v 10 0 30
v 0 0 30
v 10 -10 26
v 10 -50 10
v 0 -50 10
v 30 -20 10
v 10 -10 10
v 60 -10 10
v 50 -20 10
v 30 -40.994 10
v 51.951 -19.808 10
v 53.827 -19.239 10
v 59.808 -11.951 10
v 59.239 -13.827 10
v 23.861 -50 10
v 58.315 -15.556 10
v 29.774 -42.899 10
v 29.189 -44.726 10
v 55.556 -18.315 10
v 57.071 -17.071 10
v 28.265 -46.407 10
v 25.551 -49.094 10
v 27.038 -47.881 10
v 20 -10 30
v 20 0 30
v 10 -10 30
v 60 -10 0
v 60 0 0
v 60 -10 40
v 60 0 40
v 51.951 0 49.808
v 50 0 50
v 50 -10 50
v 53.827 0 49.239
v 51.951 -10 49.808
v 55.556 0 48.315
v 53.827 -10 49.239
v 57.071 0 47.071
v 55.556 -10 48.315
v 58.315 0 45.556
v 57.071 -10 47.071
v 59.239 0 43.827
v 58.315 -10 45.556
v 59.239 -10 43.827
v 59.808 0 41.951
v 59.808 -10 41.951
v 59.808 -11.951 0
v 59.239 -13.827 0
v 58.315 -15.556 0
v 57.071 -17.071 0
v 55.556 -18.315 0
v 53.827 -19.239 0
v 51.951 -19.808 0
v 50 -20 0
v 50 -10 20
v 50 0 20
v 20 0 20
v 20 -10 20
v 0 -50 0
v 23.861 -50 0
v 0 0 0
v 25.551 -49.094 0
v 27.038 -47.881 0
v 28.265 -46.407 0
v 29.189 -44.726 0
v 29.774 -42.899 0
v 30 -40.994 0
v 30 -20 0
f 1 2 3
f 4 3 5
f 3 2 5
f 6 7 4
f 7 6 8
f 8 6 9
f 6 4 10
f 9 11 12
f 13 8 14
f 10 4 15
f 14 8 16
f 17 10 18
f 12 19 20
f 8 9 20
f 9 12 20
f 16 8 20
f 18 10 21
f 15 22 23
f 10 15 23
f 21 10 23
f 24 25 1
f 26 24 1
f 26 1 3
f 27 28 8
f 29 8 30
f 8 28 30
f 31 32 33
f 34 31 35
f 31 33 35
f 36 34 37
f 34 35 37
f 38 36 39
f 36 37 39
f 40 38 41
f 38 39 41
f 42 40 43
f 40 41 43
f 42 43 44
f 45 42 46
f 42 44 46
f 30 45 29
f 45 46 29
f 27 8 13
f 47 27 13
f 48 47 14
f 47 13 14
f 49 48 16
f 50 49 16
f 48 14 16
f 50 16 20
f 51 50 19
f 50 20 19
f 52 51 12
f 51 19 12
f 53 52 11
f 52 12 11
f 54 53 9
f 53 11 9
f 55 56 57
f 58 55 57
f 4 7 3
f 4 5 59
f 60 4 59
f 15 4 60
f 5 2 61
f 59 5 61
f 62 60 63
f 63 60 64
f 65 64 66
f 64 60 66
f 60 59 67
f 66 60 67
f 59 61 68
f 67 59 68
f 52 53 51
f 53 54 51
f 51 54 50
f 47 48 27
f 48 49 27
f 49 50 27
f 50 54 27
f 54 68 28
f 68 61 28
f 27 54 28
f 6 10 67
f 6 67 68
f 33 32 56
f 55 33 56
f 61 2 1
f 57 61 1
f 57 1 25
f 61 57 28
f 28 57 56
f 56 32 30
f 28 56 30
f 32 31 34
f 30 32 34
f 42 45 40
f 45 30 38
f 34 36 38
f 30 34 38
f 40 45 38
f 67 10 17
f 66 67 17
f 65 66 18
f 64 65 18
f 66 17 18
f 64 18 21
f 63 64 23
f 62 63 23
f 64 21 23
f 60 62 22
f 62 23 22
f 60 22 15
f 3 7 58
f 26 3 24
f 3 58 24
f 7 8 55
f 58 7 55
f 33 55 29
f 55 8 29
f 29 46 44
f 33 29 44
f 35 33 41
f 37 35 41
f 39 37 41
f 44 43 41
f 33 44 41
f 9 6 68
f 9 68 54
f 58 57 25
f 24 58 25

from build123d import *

# Parameters (mm, degrees)
F1_DEPTH  = 50
F3_DEPTH  = 40
F4_W      = 10
F4_H      = 10
F5_DEPTH  = 40
F7_DEPTH  = 10
F8_W      = 40
F8_H      = 30
F9_DEPTH  = 40
F11_DEPTH = 25
F12_W     = 30
F12_H     = 30
F13_DEPTH = 10
F15_DEPTH = 10


with BuildPart() as f1:
    # F0 (on Front) → F1 (new body)
    with BuildSketch(Plane.XZ):
        Polygon((0, 30), (0, 0), (60, 0), (60, 50), (50, 50), (50, 20), (20, 20), (20, 30), align=None)
    extrude(amount=F1_DEPTH)

    # F2 (on face) → F3 (cut)
    with BuildSketch(Plane.XZ.offset(50)):
        Polygon((10, 20), (10, 10), (60, 10), (60, 20), (50, 20), (20, 20), align=None)
    extrude(amount=-F3_DEPTH, mode=Mode.SUBTRACT)

    # F4 (on face) → F5 (cut)
    with BuildSketch(Plane.XZ.offset(50)):
        with Locations((15, 25)):
            Rectangle(F4_W, F4_H)
    extrude(amount=-F5_DEPTH, mode=Mode.SUBTRACT)

    # F6 (on face) → F7 (cut)
    with BuildSketch(Plane(origin=(0, 0, 0), x_dir=(0, -1, 0), z_dir=(-1, 0, 0))):
        Polygon((0, 30), (50, 10), (50, 30), align=None)
    extrude(amount=-F7_DEPTH, mode=Mode.SUBTRACT)

    # F8 (on face) → F9 (cut)
    with BuildSketch(Plane.YZ.offset(60)):
        with Locations((-30, 35)):
            Rectangle(F8_W, F8_H)
    extrude(amount=-F9_DEPTH, mode=Mode.SUBTRACT)

    # F10 (on face) → F11 (cut)
    with BuildSketch(Plane.XZ.offset(10)):
        with BuildLine():
            ThreePointArc((50, 50), (57.0710678119, 47.0710678119), (60, 40))
            Line((60, 40), (60, 50))
            Line((60, 50), (50, 50))
        make_face()
    extrude(amount=-F11_DEPTH, mode=Mode.SUBTRACT)

    # F12 (on face) → F13 (cut)
    with BuildSketch(Plane.XY.offset(10)):
        with Locations((45, -35)):
            Rectangle(F12_W, F12_H)
    extrude(amount=-F13_DEPTH, mode=Mode.SUBTRACT)

    # F14 (on face) → F15 (cut)
    with BuildSketch(Plane.XY.offset(10)):
        with BuildLine():
            ThreePointArc((60, -10), (57.0710678119, -17.0710678119), (50, -20))
            Line((50, -20), (60, -20))
            Line((60, -20), (60, -10))
        make_face()
        with BuildLine():
            Line((30, -50), (30, -40.9943062672))
            ThreePointArc((30, -40.9943062672), (28.2651766354, -46.407029811), (23.8608885556, -50))
            Line((23.8608885556, -50), (30, -50))
        make_face()
    extrude(amount=-F15_DEPTH, mode=Mode.SUBTRACT)


solid = f1.part
